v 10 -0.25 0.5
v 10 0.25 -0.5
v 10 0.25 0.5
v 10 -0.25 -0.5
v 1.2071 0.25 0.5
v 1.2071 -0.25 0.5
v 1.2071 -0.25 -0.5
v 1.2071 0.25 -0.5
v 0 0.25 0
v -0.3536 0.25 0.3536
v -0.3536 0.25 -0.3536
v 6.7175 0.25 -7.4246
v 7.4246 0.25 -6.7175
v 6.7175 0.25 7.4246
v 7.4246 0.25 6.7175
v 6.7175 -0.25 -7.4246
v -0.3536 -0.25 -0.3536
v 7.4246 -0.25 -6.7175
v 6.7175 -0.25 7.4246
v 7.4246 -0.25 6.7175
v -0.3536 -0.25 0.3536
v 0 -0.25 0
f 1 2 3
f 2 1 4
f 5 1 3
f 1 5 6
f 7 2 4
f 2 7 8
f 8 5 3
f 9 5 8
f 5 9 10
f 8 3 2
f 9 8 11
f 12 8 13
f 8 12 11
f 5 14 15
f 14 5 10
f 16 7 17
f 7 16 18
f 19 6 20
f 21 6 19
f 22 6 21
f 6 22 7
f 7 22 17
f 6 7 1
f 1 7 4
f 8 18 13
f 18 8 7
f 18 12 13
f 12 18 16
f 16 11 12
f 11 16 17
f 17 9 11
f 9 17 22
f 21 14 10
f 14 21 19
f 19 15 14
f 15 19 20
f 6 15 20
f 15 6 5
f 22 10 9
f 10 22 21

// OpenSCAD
length = 10;
width_y = 0.5;
width_z = 1;
module shape() {
    translate([length/2, 0, 0])
    cube([length, width_y, width_z], center=true);
}

shape();
color("Salmon") rotate(a=45, v=[0, 1, 0]) shape();
color("LightSlateGray") rotate(a=45, v=[0, -1, 0]) shape();
